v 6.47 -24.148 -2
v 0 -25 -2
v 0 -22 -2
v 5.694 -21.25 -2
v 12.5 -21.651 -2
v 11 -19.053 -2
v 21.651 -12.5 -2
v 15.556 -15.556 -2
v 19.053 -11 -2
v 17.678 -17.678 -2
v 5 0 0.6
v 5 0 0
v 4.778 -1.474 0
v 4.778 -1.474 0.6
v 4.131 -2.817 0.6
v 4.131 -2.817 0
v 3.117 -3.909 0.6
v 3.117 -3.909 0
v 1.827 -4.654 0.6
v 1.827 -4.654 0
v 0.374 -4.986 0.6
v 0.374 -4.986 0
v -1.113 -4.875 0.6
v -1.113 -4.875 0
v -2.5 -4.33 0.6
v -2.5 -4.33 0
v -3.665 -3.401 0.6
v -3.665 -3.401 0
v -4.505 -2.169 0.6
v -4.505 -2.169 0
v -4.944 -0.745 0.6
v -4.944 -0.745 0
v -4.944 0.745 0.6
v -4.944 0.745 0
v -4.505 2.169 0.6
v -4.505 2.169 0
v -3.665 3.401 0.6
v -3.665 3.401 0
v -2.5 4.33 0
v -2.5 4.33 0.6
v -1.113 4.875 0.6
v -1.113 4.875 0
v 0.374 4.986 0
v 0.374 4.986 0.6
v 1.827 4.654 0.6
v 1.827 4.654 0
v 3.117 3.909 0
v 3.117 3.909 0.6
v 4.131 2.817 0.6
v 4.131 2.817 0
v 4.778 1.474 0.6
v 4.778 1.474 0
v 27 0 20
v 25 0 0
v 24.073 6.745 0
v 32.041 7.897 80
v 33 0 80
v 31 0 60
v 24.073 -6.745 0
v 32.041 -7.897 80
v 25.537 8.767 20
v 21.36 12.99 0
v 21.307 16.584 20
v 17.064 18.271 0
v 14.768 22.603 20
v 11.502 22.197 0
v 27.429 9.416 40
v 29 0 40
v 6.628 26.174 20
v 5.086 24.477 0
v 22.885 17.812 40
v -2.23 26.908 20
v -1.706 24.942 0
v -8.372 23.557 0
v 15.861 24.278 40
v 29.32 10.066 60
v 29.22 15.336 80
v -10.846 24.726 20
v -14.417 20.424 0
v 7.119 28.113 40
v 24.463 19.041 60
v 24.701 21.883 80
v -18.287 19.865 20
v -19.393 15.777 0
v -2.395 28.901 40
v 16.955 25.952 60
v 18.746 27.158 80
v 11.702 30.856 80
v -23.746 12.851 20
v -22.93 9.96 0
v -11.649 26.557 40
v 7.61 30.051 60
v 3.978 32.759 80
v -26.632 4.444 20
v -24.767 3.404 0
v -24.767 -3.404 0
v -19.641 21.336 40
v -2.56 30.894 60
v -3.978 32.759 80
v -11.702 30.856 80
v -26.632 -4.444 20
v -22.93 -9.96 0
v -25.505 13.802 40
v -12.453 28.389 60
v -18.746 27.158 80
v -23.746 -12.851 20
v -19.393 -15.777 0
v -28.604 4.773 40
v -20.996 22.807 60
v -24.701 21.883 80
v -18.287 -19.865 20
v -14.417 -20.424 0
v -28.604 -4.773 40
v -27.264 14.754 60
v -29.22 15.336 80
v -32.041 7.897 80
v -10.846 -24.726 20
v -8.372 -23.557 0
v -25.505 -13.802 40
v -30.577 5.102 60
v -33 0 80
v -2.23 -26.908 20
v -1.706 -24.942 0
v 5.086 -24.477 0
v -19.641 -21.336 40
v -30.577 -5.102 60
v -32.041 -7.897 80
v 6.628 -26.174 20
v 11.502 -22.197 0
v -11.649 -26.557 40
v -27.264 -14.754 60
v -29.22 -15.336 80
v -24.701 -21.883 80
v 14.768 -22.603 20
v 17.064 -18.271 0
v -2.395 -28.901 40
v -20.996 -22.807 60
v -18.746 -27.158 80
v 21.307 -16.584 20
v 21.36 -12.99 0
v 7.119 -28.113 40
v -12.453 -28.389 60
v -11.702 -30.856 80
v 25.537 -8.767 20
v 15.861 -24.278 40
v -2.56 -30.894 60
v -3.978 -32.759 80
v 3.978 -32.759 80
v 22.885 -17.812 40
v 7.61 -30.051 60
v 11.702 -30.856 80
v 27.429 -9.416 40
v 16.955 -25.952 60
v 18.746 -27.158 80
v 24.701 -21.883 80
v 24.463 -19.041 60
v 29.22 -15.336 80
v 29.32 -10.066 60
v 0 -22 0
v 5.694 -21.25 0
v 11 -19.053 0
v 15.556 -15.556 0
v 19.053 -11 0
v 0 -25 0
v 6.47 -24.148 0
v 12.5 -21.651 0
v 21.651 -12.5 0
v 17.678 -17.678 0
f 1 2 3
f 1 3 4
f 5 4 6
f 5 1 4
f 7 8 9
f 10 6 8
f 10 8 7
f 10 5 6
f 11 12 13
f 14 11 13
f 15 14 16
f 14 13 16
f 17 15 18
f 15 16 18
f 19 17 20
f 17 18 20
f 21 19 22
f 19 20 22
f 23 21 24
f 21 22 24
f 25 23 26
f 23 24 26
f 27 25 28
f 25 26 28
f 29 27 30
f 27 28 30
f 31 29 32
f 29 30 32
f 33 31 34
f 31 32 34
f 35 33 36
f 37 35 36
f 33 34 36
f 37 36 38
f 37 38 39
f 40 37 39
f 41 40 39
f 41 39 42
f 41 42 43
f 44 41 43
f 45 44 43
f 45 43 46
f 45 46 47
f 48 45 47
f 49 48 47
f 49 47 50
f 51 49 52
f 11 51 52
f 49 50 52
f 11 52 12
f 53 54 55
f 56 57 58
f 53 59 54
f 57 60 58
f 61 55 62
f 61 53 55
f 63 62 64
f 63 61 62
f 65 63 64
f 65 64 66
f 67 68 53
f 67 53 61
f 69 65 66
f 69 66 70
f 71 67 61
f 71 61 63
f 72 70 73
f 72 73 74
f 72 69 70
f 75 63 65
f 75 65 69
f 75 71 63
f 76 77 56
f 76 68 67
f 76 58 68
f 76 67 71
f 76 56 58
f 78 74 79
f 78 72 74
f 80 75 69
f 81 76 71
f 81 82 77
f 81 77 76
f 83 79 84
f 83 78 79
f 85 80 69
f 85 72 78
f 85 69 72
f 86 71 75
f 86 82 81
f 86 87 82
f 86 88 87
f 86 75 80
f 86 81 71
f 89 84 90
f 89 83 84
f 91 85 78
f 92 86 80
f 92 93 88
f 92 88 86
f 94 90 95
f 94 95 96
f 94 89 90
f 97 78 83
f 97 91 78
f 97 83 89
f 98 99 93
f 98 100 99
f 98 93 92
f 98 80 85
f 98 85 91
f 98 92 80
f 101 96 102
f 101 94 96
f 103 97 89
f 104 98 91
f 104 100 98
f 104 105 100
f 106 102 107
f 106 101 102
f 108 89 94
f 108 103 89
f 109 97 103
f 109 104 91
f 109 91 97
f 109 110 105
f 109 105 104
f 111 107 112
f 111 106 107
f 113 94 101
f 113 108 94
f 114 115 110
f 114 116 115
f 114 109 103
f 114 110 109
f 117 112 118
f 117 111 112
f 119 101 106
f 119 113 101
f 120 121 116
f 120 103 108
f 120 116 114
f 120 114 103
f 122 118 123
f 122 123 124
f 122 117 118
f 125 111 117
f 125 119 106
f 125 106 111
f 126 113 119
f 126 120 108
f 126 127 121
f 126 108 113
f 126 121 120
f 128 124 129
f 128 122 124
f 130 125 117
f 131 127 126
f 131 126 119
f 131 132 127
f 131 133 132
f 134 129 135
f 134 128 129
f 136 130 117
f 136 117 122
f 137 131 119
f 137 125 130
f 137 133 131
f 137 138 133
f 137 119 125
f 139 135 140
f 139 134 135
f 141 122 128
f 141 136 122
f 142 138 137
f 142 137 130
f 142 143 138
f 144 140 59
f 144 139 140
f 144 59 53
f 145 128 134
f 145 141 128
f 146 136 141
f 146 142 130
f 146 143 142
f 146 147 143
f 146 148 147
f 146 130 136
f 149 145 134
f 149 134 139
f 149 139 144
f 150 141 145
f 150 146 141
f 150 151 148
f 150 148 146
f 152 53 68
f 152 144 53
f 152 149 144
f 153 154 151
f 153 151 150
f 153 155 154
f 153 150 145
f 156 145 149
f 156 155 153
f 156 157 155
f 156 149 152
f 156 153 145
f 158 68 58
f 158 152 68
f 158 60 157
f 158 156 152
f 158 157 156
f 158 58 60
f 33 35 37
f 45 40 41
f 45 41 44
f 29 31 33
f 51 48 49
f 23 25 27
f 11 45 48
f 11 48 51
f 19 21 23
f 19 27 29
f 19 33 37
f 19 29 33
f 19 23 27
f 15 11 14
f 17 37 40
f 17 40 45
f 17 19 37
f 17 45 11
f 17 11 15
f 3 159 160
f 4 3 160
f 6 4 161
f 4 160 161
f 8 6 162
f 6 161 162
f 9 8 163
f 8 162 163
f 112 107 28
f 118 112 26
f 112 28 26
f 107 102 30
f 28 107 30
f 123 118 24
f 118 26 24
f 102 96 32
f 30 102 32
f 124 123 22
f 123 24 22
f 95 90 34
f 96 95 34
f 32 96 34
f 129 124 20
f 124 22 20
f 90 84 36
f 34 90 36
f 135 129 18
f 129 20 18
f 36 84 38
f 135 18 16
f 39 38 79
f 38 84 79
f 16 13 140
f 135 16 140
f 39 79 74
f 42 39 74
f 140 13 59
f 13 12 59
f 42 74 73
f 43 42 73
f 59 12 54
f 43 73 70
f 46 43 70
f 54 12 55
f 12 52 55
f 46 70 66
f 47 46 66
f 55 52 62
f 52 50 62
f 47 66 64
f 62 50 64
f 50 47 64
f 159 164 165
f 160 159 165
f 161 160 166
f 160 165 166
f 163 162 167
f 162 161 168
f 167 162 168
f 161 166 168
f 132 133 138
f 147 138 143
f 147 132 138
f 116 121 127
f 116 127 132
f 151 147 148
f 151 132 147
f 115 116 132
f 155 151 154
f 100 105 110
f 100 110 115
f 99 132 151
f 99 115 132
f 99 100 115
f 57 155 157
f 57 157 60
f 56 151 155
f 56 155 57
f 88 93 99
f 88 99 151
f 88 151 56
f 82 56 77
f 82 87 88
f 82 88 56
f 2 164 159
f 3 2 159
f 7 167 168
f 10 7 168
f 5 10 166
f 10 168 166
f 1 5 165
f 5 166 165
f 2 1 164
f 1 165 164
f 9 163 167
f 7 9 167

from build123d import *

# Parameters (mm, degrees)
F2_R     = 25
F3_R     = 33
F5_R     = 5
F6_DEPTH = 0.6
F8_DEPTH = 2


# Not quite as in the source:
# - a feature names something its author has since deleted; it is built from what else it names


with BuildPart() as f4:
    # F2 (on Top) → F4 section 0
    with BuildSketch(Plane.XY):
        Circle(F2_R)
    # F3 (on offset) → F4 section 1
    with BuildSketch(Plane.XY.offset(80)):
        Circle(F3_R)
    loft()

    # F5 (on face) → F6 (cut)
    with BuildSketch(Plane(origin=(0, 0, 0), x_dir=(1, 0, 0), z_dir=(0, 0, -1))):
        Circle(F5_R)
    extrude(amount=-F6_DEPTH, mode=Mode.SUBTRACT)


with BuildPart() as f8:
    # F7 (on face) → F8 (new body)
    with BuildSketch(Plane(origin=(0, 0, 0), x_dir=(1, 0, 0), z_dir=(0, 0, -1))):
        with BuildLine():
            ThreePointArc((21.6506350946, 12.5), (12.5, 21.6506350946), (0, 25))
            Line((0, 25), (0, 22))
            ThreePointArc((0, 22), (11, 19.0525588833), (19.0525588833, 11))
            Line((19.0525588833, 11), (21.6506350946, 12.5))
        make_face()
    extrude(amount=F8_DEPTH)


solid = Compound([f4.part, f8.part])
